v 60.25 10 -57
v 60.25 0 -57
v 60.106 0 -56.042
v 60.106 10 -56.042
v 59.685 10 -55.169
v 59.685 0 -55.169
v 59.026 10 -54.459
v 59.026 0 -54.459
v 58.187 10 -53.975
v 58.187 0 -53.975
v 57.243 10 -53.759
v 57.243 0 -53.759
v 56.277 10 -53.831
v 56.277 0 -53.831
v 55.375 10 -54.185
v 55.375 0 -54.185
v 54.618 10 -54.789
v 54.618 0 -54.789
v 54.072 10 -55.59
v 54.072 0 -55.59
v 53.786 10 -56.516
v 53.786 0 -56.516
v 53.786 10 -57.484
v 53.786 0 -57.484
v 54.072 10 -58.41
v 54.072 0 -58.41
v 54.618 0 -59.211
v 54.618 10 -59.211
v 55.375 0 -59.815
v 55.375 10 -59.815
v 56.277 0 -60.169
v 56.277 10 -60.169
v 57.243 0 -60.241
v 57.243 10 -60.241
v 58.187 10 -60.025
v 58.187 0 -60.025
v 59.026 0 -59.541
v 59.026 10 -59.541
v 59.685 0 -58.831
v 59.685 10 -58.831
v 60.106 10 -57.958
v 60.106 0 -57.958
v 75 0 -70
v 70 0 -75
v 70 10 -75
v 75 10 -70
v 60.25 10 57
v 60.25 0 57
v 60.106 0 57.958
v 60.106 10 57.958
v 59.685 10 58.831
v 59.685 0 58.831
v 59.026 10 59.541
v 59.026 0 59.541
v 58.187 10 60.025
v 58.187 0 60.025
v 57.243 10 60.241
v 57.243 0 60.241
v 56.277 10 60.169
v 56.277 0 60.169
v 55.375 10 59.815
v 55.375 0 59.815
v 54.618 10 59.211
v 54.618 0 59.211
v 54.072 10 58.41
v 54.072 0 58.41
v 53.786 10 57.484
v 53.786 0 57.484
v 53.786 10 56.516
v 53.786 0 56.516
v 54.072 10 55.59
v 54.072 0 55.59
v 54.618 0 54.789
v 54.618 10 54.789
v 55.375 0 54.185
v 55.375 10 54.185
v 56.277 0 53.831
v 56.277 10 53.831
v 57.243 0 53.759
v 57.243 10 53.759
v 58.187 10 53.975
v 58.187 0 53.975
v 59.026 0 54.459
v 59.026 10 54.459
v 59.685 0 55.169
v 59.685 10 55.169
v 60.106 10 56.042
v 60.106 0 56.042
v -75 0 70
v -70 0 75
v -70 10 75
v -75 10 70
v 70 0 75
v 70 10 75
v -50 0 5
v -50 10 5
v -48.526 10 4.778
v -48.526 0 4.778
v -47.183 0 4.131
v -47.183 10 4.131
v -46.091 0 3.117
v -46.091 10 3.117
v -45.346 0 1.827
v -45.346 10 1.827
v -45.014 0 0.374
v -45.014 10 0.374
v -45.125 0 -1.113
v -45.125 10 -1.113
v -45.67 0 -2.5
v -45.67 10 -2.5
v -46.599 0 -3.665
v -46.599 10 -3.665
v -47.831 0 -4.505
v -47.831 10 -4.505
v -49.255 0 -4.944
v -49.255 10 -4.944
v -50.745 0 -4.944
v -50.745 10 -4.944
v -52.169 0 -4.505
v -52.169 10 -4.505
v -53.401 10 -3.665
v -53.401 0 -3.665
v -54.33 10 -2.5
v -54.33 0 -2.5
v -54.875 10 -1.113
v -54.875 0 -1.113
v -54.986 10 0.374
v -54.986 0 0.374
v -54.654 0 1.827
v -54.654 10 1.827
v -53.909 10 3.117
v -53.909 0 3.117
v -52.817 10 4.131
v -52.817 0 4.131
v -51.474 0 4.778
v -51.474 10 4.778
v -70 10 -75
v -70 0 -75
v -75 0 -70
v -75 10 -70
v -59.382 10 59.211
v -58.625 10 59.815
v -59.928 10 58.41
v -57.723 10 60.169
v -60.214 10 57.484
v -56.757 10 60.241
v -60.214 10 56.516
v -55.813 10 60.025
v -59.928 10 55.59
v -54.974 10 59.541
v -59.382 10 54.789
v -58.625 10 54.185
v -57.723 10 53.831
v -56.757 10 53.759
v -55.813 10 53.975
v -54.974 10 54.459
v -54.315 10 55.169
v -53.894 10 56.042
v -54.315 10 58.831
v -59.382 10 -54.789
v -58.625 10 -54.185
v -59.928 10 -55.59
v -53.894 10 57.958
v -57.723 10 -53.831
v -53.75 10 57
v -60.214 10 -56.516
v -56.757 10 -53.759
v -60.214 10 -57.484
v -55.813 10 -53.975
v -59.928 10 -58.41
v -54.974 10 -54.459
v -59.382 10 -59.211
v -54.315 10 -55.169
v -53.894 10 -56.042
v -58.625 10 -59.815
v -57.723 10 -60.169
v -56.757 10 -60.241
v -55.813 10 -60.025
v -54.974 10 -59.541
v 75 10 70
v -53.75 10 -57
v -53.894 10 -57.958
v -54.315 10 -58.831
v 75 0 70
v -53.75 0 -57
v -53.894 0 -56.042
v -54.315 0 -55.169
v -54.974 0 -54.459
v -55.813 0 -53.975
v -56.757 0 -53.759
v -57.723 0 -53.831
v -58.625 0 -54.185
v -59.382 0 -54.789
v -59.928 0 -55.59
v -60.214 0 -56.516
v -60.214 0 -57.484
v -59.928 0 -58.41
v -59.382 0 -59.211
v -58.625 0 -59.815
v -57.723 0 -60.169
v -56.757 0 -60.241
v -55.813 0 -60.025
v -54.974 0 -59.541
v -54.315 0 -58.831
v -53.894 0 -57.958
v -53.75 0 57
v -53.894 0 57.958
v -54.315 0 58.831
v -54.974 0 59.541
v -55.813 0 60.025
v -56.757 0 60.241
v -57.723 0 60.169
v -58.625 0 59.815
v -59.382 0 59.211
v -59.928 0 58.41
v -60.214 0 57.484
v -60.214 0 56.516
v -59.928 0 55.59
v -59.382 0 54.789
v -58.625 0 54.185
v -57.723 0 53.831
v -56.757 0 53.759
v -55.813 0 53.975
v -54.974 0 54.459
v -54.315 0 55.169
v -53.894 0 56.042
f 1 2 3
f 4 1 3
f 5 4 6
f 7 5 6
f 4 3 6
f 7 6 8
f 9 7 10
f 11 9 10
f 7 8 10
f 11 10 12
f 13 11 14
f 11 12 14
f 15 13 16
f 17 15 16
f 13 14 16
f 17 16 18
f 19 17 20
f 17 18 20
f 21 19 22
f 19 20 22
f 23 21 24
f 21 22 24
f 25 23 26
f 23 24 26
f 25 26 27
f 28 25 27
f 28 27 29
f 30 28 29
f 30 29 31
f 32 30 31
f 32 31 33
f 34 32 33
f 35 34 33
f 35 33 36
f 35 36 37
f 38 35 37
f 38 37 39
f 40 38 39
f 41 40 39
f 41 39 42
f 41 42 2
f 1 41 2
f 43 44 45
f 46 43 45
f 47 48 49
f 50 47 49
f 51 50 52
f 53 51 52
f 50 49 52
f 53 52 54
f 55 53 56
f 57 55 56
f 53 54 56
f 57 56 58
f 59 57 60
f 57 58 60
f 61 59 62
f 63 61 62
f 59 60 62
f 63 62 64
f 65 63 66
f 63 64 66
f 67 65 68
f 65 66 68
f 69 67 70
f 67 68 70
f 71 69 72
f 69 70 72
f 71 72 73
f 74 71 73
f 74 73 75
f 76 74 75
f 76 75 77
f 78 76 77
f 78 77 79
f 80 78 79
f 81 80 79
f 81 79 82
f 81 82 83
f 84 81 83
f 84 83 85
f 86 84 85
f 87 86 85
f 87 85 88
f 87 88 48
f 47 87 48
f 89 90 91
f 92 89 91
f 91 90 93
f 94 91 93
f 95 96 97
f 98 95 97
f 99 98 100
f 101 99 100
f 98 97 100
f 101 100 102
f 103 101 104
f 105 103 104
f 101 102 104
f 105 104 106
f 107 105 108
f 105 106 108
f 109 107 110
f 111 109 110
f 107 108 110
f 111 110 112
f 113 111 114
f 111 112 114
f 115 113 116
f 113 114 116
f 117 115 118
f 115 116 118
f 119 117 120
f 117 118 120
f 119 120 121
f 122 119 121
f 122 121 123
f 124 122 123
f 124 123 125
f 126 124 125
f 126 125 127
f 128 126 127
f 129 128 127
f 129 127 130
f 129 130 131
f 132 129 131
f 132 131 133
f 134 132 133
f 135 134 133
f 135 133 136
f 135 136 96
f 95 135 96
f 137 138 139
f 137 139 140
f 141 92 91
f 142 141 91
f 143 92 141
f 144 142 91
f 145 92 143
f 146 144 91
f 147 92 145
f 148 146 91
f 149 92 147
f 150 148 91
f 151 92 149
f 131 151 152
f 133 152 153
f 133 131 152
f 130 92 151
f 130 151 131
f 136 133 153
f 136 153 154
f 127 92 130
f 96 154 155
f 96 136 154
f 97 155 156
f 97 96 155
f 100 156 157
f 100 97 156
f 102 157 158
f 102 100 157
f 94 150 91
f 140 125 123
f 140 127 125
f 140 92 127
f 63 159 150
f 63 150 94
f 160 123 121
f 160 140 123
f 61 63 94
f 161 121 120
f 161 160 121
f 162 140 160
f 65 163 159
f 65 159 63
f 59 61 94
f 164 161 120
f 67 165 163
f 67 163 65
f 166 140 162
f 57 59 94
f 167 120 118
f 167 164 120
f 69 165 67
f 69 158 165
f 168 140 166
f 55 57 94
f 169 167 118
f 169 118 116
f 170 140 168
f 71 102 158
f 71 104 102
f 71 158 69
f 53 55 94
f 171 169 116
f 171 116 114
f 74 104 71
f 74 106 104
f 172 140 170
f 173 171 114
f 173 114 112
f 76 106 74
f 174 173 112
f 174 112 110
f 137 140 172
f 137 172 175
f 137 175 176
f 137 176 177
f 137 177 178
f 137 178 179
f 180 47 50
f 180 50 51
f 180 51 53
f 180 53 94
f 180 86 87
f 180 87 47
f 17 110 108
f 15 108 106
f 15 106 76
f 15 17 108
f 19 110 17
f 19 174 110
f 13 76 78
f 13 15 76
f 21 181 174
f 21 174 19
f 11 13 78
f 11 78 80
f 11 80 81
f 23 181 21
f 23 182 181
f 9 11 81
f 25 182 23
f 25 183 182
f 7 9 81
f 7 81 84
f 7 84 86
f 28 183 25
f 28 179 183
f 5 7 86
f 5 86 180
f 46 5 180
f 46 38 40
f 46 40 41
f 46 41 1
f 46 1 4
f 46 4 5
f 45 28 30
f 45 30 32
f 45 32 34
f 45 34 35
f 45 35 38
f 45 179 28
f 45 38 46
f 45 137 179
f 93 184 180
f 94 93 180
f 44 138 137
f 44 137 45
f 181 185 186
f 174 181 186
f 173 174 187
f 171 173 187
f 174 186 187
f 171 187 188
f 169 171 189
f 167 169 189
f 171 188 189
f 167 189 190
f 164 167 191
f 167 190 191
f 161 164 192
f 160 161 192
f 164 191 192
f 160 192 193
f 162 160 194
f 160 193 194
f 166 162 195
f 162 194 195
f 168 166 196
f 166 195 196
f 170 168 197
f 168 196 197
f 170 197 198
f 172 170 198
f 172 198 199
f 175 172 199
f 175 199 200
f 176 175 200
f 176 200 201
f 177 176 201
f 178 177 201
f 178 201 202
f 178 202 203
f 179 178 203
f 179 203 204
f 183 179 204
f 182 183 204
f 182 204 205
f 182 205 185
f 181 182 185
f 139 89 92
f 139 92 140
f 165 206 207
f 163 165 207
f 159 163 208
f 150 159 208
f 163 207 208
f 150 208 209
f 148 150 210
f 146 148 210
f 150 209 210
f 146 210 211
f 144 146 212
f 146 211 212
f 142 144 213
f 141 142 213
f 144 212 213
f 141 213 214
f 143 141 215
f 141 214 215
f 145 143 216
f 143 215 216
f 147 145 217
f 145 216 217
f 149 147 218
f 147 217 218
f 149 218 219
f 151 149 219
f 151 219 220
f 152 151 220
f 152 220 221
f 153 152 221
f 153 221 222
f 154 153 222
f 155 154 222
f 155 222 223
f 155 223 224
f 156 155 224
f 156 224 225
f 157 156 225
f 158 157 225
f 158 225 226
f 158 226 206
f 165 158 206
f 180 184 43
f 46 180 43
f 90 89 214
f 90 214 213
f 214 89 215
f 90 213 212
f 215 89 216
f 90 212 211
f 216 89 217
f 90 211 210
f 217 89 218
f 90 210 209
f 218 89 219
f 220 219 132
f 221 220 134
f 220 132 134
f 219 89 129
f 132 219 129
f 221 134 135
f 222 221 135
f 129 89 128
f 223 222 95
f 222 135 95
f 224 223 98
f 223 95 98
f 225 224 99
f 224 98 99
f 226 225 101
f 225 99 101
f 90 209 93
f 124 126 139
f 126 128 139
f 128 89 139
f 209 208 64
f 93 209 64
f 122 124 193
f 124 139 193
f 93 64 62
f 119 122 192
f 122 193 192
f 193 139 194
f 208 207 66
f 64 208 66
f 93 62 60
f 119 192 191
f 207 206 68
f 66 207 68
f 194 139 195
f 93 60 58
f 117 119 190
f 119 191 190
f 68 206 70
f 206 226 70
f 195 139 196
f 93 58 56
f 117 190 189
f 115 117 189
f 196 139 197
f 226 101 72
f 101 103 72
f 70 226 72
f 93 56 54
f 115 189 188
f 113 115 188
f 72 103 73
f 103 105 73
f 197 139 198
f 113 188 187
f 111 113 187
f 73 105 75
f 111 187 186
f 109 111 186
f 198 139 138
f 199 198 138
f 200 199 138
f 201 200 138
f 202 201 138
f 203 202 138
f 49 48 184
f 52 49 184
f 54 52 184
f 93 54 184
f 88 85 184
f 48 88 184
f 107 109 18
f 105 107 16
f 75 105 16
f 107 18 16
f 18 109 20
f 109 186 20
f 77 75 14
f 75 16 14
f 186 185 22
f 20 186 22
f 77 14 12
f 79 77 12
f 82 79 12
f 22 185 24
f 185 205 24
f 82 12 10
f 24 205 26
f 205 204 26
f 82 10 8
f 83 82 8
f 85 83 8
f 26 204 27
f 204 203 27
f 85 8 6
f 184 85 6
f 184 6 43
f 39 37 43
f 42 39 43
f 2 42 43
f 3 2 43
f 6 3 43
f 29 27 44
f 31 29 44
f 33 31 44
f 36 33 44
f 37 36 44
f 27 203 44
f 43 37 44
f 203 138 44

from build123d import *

# Parameters (mm, degrees)
SKETCH1_W            = 150
SKETCH1_H            = 150
BOSS_EXTRUDE1_DEPTH  = 10
CHAMFER1_SIZE        = 5
M6_CLEARANCE_HOLE1_D = 6.5
SKETCH2_R            = 5
CUT_EXTRUDE1_DEPTH   = 15


with BuildPart() as part:
    # Sketch1 → Boss-Extrude1 (new body)
    with BuildSketch(Plane(origin=(0, 0, 0), x_dir=(1, 0, 0), z_dir=(0, 1, 0))):
        Rectangle(SKETCH1_W, SKETCH1_H)
    extrude(amount=BOSS_EXTRUDE1_DEPTH)

    # Chamfer1
    chamfer1_edges = [part.edges().sort_by_distance(p)[0] for p in [
        (-75, 5, -75),
        (75, 5, -75),
        (75, 5, 75),
        (-75, 5, 75),
    ]]
    chamfer(chamfer1_edges, length=CHAMFER1_SIZE)

    # M6 Clearance Hole1 (through all)
    with Locations(Plane(origin=(0, 10, 0), x_dir=(-1, 0, 0), z_dir=(0, 1, 0))):
        with Locations((57, -57), (-57, -57), (57, 57), (-57, 57)):
            Hole(M6_CLEARANCE_HOLE1_D / 2)

    # Sketch2 → Cut-Extrude1 (cut)
    with BuildSketch(Plane(origin=(0, 10, 0), x_dir=(1, 0, 0), z_dir=(0, 1, 0))):
        with Locations(Location((-50, 0, 0), (0, 0, 270))):
            Circle(SKETCH2_R)
    extrude(amount=-CUT_EXTRUDE1_DEPTH, mode=Mode.SUBTRACT)


solid = part.part
